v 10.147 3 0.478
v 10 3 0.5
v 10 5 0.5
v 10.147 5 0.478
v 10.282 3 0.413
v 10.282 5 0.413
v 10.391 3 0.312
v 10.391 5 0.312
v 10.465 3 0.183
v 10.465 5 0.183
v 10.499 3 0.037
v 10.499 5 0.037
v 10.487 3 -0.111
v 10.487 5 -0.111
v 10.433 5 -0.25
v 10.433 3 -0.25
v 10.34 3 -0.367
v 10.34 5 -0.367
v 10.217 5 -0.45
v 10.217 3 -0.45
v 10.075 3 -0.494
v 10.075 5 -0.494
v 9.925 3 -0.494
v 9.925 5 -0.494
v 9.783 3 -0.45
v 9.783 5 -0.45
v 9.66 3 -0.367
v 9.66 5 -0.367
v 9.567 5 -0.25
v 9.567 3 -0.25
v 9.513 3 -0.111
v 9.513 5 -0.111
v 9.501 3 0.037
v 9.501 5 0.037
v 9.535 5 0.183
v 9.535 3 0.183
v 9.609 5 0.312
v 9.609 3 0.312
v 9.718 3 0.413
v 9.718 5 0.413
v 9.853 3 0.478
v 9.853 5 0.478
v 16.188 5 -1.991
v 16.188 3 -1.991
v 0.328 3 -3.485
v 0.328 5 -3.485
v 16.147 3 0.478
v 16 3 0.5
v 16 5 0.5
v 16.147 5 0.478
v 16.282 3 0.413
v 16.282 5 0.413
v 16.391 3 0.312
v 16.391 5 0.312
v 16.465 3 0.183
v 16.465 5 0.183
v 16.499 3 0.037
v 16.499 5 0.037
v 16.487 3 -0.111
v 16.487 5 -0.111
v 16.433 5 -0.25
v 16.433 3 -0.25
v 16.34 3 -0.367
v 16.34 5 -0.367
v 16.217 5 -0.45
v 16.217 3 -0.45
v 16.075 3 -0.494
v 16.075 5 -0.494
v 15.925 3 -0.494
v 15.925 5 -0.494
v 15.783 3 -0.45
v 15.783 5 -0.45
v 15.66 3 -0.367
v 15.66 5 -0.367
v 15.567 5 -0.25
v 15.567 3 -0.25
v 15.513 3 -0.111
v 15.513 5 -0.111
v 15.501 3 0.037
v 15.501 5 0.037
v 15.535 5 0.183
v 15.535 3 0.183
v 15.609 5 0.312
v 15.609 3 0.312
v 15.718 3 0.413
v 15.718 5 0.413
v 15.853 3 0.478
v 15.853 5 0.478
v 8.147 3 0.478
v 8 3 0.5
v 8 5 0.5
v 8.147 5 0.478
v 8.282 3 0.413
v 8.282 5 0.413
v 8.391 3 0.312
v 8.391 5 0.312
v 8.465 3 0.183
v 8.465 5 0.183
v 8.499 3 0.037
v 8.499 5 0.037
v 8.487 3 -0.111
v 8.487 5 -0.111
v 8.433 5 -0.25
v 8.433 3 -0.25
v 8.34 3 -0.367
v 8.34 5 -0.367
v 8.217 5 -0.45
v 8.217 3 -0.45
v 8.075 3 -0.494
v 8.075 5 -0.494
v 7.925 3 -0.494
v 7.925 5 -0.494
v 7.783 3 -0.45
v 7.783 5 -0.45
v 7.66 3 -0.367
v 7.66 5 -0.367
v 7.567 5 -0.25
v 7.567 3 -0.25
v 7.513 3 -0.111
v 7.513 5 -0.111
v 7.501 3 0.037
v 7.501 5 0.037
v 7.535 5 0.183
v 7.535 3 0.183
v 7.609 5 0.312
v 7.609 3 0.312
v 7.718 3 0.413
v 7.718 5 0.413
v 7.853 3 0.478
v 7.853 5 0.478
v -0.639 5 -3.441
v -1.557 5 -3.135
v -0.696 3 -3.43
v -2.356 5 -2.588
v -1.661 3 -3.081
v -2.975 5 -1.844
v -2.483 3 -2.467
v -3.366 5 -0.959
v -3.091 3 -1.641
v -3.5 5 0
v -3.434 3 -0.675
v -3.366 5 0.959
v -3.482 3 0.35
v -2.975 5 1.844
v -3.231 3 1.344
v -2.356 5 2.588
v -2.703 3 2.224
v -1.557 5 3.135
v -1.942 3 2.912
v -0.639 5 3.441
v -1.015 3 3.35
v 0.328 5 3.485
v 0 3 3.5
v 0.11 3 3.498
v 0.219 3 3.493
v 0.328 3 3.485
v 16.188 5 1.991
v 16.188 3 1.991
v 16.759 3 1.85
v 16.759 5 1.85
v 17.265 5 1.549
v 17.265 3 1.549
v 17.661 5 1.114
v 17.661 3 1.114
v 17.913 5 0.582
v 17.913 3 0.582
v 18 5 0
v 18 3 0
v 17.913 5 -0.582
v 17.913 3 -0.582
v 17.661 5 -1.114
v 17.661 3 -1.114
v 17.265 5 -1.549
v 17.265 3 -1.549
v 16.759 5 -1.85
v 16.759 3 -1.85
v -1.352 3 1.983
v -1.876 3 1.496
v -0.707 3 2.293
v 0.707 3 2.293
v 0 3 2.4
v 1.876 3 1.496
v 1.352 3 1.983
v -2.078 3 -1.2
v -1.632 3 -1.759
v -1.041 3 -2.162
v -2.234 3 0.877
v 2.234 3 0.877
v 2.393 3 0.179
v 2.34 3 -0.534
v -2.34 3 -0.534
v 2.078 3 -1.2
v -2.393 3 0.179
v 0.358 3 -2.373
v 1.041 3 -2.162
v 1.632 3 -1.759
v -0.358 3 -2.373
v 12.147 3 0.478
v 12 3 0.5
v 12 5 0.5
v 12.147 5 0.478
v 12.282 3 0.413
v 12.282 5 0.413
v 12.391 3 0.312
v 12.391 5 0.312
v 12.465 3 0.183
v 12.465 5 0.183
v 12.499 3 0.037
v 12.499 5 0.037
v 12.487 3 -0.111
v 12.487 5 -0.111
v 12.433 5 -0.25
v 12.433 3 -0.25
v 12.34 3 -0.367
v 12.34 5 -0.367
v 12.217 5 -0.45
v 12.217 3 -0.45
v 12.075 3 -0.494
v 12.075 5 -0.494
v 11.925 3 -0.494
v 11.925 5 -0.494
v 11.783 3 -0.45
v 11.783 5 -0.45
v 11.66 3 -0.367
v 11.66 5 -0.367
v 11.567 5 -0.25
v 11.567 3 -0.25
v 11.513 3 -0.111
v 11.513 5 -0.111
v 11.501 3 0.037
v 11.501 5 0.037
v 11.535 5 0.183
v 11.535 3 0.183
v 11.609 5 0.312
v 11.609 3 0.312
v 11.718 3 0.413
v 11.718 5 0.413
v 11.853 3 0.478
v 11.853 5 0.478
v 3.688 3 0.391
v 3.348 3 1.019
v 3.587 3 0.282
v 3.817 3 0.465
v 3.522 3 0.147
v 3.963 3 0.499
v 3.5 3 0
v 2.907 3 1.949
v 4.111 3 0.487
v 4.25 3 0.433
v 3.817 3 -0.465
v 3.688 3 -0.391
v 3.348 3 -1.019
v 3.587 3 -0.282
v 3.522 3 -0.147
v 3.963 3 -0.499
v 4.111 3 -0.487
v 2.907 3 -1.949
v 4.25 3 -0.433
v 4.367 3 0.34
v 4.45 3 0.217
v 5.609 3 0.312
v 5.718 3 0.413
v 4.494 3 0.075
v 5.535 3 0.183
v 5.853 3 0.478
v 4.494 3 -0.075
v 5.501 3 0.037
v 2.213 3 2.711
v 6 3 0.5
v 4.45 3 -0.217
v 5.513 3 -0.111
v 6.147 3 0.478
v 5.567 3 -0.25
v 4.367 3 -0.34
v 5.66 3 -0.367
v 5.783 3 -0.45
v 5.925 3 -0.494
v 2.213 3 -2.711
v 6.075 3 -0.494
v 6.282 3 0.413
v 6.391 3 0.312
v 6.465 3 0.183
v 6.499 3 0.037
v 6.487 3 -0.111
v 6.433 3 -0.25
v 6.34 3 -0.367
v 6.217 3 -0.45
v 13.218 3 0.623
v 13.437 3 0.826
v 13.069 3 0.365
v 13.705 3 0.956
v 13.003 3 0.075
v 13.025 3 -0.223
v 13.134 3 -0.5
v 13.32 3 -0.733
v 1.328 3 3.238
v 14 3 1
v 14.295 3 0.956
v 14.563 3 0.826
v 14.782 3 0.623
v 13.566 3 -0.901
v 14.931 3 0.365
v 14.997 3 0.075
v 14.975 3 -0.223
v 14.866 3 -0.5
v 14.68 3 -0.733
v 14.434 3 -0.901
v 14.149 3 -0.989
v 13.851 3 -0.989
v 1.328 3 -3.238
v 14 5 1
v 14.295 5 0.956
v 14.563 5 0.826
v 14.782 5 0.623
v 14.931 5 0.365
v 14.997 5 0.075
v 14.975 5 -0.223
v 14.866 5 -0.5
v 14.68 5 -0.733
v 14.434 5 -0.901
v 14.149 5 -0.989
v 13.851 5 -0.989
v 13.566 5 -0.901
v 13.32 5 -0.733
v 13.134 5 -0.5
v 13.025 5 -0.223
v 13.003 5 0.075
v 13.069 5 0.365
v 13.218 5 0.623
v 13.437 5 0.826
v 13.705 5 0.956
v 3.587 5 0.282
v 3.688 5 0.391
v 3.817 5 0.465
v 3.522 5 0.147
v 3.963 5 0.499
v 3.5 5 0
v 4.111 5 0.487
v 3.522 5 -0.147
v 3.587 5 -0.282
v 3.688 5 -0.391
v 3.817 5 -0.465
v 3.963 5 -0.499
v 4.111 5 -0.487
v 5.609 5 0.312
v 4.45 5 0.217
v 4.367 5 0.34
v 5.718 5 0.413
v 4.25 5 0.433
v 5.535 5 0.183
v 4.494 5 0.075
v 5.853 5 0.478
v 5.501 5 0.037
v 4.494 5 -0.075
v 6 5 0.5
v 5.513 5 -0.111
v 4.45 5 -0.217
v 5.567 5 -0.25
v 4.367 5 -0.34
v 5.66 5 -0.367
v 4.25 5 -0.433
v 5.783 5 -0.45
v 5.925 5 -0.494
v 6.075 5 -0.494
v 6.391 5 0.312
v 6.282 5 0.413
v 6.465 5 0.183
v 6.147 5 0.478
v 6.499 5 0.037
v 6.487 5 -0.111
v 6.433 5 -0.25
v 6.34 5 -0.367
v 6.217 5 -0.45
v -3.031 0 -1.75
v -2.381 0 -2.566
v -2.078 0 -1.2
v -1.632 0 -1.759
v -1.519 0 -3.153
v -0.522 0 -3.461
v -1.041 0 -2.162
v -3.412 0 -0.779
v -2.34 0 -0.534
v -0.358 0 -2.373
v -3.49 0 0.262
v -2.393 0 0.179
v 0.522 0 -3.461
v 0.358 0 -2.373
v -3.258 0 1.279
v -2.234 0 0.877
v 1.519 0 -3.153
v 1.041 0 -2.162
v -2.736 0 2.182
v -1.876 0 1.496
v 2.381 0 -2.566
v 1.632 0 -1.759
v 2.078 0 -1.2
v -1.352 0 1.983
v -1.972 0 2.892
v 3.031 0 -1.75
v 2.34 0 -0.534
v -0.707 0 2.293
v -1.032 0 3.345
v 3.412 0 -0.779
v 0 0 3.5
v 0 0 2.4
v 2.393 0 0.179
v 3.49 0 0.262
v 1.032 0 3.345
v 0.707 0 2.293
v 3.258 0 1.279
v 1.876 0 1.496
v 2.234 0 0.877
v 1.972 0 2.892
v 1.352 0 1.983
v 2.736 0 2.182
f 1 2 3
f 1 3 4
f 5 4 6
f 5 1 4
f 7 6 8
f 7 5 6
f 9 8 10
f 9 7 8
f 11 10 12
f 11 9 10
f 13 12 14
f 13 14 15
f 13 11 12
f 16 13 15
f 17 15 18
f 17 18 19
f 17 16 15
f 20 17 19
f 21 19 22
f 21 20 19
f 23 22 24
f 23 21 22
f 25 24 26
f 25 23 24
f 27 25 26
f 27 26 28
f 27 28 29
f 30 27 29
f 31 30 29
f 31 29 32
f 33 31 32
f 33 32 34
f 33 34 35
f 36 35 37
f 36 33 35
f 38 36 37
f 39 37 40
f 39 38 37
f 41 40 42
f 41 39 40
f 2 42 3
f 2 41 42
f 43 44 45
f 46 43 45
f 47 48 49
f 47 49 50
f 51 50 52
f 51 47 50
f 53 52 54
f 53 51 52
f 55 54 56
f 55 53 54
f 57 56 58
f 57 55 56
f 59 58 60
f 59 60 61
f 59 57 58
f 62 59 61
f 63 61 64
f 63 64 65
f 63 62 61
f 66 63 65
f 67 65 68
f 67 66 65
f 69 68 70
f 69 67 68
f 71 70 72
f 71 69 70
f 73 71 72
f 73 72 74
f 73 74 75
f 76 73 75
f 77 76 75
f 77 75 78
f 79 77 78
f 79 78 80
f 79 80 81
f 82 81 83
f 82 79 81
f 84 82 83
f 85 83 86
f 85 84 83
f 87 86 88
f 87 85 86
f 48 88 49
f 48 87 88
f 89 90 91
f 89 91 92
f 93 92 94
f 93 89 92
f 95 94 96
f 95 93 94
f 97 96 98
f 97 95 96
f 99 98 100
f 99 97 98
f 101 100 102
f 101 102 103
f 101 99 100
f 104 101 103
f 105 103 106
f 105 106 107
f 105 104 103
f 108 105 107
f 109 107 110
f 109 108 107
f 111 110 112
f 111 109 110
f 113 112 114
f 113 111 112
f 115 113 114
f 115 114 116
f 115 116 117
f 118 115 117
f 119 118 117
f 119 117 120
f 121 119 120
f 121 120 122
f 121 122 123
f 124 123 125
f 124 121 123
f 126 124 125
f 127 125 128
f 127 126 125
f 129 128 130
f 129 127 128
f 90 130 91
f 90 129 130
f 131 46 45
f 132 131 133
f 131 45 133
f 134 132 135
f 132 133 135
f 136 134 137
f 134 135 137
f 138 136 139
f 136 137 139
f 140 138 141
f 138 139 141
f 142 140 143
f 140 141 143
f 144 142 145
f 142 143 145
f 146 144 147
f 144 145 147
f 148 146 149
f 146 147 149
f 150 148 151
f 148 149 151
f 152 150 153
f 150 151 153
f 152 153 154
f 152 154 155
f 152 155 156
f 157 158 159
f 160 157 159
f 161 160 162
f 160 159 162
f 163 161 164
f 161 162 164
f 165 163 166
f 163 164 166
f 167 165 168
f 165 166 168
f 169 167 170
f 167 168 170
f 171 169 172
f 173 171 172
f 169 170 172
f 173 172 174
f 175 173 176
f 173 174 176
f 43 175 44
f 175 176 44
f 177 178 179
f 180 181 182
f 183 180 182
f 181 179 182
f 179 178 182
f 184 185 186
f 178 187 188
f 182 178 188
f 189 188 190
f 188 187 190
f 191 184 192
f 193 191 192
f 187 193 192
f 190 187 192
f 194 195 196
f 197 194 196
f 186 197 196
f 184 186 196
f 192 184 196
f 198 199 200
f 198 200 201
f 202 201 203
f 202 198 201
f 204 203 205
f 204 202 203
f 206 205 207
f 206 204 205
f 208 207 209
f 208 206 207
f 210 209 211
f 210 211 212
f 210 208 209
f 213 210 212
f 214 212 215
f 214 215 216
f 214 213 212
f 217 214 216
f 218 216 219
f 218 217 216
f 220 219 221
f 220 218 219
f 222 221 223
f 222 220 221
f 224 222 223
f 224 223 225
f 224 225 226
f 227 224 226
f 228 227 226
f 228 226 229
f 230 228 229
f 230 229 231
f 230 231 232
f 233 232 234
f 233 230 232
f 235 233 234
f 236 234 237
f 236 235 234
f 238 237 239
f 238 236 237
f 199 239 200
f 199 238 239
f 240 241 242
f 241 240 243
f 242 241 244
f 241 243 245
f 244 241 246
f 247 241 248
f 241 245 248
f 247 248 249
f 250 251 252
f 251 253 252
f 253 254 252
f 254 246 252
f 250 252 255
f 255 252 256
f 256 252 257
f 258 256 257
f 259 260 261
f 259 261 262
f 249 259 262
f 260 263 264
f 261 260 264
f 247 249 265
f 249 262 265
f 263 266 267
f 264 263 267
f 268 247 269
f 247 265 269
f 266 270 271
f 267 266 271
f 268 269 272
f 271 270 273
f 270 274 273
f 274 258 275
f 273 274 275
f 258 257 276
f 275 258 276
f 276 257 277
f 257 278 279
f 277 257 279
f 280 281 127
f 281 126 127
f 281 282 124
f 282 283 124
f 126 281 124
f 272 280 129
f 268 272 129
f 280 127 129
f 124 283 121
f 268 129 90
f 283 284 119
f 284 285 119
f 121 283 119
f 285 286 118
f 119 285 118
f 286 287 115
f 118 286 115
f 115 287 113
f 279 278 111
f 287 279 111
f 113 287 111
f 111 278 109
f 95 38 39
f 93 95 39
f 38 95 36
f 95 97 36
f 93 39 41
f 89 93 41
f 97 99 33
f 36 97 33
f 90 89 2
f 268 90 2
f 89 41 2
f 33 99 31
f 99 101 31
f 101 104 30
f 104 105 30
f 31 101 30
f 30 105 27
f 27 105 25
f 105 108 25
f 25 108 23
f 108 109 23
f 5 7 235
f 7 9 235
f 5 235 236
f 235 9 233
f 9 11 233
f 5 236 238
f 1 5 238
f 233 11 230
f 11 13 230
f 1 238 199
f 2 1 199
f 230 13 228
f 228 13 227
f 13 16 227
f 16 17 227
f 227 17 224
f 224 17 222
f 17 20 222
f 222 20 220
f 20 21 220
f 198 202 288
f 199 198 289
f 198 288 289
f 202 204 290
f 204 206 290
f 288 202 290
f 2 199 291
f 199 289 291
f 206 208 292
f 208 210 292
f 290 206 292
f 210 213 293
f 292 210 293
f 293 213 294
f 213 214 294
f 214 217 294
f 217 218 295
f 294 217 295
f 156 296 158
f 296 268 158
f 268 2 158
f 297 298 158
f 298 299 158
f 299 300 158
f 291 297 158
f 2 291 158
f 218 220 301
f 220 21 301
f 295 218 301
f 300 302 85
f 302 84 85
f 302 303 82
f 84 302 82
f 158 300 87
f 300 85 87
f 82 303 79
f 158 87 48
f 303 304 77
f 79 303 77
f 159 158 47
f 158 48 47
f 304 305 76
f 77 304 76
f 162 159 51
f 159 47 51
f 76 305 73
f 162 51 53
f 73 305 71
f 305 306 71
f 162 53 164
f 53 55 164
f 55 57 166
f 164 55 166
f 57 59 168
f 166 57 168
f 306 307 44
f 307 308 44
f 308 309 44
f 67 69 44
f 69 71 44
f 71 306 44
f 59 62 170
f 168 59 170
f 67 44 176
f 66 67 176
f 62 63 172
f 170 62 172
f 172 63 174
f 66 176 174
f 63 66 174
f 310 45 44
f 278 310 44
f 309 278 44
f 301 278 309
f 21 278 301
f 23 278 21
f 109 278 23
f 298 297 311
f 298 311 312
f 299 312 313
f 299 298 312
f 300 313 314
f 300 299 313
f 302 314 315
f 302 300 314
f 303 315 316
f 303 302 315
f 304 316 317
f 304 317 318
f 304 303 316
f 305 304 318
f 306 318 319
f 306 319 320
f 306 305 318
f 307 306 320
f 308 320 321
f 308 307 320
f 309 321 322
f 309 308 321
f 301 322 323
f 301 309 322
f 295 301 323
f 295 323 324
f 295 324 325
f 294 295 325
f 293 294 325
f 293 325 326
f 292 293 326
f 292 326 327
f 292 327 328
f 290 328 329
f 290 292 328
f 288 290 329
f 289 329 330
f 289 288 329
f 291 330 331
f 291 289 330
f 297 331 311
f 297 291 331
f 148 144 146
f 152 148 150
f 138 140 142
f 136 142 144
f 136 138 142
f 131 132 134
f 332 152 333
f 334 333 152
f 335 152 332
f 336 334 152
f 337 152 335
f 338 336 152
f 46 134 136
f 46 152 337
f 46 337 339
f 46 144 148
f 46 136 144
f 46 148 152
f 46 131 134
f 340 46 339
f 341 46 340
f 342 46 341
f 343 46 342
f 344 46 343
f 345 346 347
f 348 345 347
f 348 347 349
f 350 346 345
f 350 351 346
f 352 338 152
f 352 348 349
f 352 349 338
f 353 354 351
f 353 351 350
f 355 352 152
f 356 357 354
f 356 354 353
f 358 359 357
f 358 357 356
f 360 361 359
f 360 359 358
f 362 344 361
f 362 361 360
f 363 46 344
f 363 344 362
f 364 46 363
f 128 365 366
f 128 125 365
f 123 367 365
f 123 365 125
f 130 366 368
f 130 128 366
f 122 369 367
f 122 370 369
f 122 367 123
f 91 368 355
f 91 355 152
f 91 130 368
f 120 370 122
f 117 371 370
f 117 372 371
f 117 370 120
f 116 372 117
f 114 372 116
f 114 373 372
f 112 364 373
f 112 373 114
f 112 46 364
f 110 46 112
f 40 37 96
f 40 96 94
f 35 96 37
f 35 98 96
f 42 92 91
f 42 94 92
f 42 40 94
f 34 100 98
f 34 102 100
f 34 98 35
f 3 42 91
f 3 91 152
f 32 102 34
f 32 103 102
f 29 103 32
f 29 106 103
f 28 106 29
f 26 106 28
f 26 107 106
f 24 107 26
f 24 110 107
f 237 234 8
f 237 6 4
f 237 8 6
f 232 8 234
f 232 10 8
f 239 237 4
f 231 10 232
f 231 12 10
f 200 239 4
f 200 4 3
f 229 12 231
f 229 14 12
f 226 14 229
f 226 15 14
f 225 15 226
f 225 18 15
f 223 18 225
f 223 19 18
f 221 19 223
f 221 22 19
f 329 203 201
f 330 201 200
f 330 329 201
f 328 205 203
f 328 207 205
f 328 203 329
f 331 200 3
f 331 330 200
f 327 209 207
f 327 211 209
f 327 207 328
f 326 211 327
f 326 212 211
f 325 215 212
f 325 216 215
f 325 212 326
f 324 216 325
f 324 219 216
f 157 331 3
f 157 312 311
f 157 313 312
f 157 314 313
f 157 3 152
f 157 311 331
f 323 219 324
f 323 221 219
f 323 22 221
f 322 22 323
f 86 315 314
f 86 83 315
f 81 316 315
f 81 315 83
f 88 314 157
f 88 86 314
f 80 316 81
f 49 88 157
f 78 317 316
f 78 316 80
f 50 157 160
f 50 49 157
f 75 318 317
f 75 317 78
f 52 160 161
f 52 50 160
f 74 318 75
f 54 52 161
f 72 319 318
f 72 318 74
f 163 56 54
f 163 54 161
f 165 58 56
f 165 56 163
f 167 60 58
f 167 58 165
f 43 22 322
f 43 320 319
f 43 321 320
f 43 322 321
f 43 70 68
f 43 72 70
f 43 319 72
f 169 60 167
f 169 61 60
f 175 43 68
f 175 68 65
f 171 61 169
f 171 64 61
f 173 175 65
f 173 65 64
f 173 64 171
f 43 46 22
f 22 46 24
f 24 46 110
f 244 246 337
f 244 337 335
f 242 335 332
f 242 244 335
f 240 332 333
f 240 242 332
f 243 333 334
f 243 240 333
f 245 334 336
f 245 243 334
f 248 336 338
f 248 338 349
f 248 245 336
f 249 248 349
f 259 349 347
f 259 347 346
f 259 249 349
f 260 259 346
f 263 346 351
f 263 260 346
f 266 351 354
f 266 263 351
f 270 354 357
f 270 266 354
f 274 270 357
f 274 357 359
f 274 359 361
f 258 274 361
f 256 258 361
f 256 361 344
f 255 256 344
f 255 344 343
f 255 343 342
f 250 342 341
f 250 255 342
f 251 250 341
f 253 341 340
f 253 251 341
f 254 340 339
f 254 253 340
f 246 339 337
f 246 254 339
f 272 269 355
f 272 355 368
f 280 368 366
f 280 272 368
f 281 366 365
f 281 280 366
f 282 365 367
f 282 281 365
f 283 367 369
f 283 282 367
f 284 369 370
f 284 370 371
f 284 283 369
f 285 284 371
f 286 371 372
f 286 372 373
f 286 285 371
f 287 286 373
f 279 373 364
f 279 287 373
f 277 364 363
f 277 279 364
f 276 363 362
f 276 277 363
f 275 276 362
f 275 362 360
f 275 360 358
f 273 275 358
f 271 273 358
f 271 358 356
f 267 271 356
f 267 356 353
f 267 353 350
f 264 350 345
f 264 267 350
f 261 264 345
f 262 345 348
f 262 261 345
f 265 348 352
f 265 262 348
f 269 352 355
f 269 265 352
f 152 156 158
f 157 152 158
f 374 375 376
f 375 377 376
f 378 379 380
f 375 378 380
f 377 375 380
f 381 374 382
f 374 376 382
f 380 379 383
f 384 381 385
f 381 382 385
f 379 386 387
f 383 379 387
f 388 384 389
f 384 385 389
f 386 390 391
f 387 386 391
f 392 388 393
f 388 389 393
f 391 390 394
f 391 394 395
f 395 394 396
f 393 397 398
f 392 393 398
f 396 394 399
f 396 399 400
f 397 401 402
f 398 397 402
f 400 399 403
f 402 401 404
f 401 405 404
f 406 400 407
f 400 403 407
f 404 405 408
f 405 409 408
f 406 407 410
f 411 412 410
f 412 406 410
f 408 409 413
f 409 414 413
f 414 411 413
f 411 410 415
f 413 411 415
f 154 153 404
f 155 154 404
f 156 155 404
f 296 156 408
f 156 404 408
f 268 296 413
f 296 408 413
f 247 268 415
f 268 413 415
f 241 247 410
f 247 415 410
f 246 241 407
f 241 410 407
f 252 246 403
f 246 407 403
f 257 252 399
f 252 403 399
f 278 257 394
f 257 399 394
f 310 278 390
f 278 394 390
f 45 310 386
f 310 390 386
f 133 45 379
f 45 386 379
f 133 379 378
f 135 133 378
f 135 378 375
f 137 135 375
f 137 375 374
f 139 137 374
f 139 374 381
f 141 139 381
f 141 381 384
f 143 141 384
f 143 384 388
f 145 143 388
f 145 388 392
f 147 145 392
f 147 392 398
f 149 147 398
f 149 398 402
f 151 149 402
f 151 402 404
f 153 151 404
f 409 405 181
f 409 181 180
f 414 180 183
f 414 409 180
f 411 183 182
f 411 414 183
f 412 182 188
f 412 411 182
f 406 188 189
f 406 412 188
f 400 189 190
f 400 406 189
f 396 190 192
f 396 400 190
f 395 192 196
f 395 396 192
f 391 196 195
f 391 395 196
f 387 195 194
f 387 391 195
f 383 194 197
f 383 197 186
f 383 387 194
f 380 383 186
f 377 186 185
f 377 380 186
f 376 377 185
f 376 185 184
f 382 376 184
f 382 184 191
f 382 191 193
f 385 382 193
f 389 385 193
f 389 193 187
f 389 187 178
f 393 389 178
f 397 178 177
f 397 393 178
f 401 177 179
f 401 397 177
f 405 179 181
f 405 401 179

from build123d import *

# Parameters (mm, degrees)
SKETCH1_R           = 3.5
SKETCH1_R_2         = 2.4
BOSS_EXTRUDE1_DEPTH = 3
SKETCH2_R           = 1
SKETCH2_R_2         = 0.5
BOSS_EXTRUDE2_DEPTH = 2


with BuildPart() as part:
    # Sketch1 → Boss-Extrude1 (new body)
    with BuildSketch(Plane(origin=(0, 0, 0), x_dir=(1, 0, 0), z_dir=(0, 1, 0))):
        with Locations(Location((0, 0, 0), (0, 0, 270))):
            Circle(SKETCH1_R)
        with Locations(Location((0, 0, 0), (0, 0, 270))):
            Circle(SKETCH1_R_2, mode=Mode.SUBTRACT)
    extrude(amount=BOSS_EXTRUDE1_DEPTH)

    # Sketch2 → Boss-Extrude2 (add)
    with BuildSketch(Plane(origin=(0, 3, 0), x_dir=(1, 0, 0), z_dir=(0, 1, 0))):
        with BuildLine():
            Line((16.1875, 1.99119154), (0.328125, 3.484585195))
            ThreePointArc((0.328125, 3.484585195), (-3.5, 0), (0.328125, -3.484585195))
            Line((0.328125, -3.484585195), (16.1875, -1.99119154))
            ThreePointArc((16.1875, -1.99119154), (18, 0), (16.1875, 1.99119154))
        make_face()
        with Locations(Location((14, 0, 0), (0, 0, 270))):
            Circle(SKETCH2_R, mode=Mode.SUBTRACT)
        with Locations(Location((4, 0, 0), (0, 0, 180))):
            Circle(SKETCH2_R_2, mode=Mode.SUBTRACT)
        with Locations(Location((6, 0, 0), (0, 0, 270))):
            Circle(SKETCH2_R_2, mode=Mode.SUBTRACT)
        with Locations(Location((8, 0, 0), (0, 0, 270))):
            Circle(SKETCH2_R_2, mode=Mode.SUBTRACT)
        with Locations(Location((10, 0, 0), (0, 0, 270))):
            Circle(SKETCH2_R_2, mode=Mode.SUBTRACT)
        with Locations(Location((12, 0, 0), (0, 0, 270))):
            Circle(SKETCH2_R_2, mode=Mode.SUBTRACT)
        with Locations(Location((16, 0, 0), (0, 0, 270))):
            Circle(SKETCH2_R_2, mode=Mode.SUBTRACT)
    extrude(amount=BOSS_EXTRUDE2_DEPTH)


solid = part.part
